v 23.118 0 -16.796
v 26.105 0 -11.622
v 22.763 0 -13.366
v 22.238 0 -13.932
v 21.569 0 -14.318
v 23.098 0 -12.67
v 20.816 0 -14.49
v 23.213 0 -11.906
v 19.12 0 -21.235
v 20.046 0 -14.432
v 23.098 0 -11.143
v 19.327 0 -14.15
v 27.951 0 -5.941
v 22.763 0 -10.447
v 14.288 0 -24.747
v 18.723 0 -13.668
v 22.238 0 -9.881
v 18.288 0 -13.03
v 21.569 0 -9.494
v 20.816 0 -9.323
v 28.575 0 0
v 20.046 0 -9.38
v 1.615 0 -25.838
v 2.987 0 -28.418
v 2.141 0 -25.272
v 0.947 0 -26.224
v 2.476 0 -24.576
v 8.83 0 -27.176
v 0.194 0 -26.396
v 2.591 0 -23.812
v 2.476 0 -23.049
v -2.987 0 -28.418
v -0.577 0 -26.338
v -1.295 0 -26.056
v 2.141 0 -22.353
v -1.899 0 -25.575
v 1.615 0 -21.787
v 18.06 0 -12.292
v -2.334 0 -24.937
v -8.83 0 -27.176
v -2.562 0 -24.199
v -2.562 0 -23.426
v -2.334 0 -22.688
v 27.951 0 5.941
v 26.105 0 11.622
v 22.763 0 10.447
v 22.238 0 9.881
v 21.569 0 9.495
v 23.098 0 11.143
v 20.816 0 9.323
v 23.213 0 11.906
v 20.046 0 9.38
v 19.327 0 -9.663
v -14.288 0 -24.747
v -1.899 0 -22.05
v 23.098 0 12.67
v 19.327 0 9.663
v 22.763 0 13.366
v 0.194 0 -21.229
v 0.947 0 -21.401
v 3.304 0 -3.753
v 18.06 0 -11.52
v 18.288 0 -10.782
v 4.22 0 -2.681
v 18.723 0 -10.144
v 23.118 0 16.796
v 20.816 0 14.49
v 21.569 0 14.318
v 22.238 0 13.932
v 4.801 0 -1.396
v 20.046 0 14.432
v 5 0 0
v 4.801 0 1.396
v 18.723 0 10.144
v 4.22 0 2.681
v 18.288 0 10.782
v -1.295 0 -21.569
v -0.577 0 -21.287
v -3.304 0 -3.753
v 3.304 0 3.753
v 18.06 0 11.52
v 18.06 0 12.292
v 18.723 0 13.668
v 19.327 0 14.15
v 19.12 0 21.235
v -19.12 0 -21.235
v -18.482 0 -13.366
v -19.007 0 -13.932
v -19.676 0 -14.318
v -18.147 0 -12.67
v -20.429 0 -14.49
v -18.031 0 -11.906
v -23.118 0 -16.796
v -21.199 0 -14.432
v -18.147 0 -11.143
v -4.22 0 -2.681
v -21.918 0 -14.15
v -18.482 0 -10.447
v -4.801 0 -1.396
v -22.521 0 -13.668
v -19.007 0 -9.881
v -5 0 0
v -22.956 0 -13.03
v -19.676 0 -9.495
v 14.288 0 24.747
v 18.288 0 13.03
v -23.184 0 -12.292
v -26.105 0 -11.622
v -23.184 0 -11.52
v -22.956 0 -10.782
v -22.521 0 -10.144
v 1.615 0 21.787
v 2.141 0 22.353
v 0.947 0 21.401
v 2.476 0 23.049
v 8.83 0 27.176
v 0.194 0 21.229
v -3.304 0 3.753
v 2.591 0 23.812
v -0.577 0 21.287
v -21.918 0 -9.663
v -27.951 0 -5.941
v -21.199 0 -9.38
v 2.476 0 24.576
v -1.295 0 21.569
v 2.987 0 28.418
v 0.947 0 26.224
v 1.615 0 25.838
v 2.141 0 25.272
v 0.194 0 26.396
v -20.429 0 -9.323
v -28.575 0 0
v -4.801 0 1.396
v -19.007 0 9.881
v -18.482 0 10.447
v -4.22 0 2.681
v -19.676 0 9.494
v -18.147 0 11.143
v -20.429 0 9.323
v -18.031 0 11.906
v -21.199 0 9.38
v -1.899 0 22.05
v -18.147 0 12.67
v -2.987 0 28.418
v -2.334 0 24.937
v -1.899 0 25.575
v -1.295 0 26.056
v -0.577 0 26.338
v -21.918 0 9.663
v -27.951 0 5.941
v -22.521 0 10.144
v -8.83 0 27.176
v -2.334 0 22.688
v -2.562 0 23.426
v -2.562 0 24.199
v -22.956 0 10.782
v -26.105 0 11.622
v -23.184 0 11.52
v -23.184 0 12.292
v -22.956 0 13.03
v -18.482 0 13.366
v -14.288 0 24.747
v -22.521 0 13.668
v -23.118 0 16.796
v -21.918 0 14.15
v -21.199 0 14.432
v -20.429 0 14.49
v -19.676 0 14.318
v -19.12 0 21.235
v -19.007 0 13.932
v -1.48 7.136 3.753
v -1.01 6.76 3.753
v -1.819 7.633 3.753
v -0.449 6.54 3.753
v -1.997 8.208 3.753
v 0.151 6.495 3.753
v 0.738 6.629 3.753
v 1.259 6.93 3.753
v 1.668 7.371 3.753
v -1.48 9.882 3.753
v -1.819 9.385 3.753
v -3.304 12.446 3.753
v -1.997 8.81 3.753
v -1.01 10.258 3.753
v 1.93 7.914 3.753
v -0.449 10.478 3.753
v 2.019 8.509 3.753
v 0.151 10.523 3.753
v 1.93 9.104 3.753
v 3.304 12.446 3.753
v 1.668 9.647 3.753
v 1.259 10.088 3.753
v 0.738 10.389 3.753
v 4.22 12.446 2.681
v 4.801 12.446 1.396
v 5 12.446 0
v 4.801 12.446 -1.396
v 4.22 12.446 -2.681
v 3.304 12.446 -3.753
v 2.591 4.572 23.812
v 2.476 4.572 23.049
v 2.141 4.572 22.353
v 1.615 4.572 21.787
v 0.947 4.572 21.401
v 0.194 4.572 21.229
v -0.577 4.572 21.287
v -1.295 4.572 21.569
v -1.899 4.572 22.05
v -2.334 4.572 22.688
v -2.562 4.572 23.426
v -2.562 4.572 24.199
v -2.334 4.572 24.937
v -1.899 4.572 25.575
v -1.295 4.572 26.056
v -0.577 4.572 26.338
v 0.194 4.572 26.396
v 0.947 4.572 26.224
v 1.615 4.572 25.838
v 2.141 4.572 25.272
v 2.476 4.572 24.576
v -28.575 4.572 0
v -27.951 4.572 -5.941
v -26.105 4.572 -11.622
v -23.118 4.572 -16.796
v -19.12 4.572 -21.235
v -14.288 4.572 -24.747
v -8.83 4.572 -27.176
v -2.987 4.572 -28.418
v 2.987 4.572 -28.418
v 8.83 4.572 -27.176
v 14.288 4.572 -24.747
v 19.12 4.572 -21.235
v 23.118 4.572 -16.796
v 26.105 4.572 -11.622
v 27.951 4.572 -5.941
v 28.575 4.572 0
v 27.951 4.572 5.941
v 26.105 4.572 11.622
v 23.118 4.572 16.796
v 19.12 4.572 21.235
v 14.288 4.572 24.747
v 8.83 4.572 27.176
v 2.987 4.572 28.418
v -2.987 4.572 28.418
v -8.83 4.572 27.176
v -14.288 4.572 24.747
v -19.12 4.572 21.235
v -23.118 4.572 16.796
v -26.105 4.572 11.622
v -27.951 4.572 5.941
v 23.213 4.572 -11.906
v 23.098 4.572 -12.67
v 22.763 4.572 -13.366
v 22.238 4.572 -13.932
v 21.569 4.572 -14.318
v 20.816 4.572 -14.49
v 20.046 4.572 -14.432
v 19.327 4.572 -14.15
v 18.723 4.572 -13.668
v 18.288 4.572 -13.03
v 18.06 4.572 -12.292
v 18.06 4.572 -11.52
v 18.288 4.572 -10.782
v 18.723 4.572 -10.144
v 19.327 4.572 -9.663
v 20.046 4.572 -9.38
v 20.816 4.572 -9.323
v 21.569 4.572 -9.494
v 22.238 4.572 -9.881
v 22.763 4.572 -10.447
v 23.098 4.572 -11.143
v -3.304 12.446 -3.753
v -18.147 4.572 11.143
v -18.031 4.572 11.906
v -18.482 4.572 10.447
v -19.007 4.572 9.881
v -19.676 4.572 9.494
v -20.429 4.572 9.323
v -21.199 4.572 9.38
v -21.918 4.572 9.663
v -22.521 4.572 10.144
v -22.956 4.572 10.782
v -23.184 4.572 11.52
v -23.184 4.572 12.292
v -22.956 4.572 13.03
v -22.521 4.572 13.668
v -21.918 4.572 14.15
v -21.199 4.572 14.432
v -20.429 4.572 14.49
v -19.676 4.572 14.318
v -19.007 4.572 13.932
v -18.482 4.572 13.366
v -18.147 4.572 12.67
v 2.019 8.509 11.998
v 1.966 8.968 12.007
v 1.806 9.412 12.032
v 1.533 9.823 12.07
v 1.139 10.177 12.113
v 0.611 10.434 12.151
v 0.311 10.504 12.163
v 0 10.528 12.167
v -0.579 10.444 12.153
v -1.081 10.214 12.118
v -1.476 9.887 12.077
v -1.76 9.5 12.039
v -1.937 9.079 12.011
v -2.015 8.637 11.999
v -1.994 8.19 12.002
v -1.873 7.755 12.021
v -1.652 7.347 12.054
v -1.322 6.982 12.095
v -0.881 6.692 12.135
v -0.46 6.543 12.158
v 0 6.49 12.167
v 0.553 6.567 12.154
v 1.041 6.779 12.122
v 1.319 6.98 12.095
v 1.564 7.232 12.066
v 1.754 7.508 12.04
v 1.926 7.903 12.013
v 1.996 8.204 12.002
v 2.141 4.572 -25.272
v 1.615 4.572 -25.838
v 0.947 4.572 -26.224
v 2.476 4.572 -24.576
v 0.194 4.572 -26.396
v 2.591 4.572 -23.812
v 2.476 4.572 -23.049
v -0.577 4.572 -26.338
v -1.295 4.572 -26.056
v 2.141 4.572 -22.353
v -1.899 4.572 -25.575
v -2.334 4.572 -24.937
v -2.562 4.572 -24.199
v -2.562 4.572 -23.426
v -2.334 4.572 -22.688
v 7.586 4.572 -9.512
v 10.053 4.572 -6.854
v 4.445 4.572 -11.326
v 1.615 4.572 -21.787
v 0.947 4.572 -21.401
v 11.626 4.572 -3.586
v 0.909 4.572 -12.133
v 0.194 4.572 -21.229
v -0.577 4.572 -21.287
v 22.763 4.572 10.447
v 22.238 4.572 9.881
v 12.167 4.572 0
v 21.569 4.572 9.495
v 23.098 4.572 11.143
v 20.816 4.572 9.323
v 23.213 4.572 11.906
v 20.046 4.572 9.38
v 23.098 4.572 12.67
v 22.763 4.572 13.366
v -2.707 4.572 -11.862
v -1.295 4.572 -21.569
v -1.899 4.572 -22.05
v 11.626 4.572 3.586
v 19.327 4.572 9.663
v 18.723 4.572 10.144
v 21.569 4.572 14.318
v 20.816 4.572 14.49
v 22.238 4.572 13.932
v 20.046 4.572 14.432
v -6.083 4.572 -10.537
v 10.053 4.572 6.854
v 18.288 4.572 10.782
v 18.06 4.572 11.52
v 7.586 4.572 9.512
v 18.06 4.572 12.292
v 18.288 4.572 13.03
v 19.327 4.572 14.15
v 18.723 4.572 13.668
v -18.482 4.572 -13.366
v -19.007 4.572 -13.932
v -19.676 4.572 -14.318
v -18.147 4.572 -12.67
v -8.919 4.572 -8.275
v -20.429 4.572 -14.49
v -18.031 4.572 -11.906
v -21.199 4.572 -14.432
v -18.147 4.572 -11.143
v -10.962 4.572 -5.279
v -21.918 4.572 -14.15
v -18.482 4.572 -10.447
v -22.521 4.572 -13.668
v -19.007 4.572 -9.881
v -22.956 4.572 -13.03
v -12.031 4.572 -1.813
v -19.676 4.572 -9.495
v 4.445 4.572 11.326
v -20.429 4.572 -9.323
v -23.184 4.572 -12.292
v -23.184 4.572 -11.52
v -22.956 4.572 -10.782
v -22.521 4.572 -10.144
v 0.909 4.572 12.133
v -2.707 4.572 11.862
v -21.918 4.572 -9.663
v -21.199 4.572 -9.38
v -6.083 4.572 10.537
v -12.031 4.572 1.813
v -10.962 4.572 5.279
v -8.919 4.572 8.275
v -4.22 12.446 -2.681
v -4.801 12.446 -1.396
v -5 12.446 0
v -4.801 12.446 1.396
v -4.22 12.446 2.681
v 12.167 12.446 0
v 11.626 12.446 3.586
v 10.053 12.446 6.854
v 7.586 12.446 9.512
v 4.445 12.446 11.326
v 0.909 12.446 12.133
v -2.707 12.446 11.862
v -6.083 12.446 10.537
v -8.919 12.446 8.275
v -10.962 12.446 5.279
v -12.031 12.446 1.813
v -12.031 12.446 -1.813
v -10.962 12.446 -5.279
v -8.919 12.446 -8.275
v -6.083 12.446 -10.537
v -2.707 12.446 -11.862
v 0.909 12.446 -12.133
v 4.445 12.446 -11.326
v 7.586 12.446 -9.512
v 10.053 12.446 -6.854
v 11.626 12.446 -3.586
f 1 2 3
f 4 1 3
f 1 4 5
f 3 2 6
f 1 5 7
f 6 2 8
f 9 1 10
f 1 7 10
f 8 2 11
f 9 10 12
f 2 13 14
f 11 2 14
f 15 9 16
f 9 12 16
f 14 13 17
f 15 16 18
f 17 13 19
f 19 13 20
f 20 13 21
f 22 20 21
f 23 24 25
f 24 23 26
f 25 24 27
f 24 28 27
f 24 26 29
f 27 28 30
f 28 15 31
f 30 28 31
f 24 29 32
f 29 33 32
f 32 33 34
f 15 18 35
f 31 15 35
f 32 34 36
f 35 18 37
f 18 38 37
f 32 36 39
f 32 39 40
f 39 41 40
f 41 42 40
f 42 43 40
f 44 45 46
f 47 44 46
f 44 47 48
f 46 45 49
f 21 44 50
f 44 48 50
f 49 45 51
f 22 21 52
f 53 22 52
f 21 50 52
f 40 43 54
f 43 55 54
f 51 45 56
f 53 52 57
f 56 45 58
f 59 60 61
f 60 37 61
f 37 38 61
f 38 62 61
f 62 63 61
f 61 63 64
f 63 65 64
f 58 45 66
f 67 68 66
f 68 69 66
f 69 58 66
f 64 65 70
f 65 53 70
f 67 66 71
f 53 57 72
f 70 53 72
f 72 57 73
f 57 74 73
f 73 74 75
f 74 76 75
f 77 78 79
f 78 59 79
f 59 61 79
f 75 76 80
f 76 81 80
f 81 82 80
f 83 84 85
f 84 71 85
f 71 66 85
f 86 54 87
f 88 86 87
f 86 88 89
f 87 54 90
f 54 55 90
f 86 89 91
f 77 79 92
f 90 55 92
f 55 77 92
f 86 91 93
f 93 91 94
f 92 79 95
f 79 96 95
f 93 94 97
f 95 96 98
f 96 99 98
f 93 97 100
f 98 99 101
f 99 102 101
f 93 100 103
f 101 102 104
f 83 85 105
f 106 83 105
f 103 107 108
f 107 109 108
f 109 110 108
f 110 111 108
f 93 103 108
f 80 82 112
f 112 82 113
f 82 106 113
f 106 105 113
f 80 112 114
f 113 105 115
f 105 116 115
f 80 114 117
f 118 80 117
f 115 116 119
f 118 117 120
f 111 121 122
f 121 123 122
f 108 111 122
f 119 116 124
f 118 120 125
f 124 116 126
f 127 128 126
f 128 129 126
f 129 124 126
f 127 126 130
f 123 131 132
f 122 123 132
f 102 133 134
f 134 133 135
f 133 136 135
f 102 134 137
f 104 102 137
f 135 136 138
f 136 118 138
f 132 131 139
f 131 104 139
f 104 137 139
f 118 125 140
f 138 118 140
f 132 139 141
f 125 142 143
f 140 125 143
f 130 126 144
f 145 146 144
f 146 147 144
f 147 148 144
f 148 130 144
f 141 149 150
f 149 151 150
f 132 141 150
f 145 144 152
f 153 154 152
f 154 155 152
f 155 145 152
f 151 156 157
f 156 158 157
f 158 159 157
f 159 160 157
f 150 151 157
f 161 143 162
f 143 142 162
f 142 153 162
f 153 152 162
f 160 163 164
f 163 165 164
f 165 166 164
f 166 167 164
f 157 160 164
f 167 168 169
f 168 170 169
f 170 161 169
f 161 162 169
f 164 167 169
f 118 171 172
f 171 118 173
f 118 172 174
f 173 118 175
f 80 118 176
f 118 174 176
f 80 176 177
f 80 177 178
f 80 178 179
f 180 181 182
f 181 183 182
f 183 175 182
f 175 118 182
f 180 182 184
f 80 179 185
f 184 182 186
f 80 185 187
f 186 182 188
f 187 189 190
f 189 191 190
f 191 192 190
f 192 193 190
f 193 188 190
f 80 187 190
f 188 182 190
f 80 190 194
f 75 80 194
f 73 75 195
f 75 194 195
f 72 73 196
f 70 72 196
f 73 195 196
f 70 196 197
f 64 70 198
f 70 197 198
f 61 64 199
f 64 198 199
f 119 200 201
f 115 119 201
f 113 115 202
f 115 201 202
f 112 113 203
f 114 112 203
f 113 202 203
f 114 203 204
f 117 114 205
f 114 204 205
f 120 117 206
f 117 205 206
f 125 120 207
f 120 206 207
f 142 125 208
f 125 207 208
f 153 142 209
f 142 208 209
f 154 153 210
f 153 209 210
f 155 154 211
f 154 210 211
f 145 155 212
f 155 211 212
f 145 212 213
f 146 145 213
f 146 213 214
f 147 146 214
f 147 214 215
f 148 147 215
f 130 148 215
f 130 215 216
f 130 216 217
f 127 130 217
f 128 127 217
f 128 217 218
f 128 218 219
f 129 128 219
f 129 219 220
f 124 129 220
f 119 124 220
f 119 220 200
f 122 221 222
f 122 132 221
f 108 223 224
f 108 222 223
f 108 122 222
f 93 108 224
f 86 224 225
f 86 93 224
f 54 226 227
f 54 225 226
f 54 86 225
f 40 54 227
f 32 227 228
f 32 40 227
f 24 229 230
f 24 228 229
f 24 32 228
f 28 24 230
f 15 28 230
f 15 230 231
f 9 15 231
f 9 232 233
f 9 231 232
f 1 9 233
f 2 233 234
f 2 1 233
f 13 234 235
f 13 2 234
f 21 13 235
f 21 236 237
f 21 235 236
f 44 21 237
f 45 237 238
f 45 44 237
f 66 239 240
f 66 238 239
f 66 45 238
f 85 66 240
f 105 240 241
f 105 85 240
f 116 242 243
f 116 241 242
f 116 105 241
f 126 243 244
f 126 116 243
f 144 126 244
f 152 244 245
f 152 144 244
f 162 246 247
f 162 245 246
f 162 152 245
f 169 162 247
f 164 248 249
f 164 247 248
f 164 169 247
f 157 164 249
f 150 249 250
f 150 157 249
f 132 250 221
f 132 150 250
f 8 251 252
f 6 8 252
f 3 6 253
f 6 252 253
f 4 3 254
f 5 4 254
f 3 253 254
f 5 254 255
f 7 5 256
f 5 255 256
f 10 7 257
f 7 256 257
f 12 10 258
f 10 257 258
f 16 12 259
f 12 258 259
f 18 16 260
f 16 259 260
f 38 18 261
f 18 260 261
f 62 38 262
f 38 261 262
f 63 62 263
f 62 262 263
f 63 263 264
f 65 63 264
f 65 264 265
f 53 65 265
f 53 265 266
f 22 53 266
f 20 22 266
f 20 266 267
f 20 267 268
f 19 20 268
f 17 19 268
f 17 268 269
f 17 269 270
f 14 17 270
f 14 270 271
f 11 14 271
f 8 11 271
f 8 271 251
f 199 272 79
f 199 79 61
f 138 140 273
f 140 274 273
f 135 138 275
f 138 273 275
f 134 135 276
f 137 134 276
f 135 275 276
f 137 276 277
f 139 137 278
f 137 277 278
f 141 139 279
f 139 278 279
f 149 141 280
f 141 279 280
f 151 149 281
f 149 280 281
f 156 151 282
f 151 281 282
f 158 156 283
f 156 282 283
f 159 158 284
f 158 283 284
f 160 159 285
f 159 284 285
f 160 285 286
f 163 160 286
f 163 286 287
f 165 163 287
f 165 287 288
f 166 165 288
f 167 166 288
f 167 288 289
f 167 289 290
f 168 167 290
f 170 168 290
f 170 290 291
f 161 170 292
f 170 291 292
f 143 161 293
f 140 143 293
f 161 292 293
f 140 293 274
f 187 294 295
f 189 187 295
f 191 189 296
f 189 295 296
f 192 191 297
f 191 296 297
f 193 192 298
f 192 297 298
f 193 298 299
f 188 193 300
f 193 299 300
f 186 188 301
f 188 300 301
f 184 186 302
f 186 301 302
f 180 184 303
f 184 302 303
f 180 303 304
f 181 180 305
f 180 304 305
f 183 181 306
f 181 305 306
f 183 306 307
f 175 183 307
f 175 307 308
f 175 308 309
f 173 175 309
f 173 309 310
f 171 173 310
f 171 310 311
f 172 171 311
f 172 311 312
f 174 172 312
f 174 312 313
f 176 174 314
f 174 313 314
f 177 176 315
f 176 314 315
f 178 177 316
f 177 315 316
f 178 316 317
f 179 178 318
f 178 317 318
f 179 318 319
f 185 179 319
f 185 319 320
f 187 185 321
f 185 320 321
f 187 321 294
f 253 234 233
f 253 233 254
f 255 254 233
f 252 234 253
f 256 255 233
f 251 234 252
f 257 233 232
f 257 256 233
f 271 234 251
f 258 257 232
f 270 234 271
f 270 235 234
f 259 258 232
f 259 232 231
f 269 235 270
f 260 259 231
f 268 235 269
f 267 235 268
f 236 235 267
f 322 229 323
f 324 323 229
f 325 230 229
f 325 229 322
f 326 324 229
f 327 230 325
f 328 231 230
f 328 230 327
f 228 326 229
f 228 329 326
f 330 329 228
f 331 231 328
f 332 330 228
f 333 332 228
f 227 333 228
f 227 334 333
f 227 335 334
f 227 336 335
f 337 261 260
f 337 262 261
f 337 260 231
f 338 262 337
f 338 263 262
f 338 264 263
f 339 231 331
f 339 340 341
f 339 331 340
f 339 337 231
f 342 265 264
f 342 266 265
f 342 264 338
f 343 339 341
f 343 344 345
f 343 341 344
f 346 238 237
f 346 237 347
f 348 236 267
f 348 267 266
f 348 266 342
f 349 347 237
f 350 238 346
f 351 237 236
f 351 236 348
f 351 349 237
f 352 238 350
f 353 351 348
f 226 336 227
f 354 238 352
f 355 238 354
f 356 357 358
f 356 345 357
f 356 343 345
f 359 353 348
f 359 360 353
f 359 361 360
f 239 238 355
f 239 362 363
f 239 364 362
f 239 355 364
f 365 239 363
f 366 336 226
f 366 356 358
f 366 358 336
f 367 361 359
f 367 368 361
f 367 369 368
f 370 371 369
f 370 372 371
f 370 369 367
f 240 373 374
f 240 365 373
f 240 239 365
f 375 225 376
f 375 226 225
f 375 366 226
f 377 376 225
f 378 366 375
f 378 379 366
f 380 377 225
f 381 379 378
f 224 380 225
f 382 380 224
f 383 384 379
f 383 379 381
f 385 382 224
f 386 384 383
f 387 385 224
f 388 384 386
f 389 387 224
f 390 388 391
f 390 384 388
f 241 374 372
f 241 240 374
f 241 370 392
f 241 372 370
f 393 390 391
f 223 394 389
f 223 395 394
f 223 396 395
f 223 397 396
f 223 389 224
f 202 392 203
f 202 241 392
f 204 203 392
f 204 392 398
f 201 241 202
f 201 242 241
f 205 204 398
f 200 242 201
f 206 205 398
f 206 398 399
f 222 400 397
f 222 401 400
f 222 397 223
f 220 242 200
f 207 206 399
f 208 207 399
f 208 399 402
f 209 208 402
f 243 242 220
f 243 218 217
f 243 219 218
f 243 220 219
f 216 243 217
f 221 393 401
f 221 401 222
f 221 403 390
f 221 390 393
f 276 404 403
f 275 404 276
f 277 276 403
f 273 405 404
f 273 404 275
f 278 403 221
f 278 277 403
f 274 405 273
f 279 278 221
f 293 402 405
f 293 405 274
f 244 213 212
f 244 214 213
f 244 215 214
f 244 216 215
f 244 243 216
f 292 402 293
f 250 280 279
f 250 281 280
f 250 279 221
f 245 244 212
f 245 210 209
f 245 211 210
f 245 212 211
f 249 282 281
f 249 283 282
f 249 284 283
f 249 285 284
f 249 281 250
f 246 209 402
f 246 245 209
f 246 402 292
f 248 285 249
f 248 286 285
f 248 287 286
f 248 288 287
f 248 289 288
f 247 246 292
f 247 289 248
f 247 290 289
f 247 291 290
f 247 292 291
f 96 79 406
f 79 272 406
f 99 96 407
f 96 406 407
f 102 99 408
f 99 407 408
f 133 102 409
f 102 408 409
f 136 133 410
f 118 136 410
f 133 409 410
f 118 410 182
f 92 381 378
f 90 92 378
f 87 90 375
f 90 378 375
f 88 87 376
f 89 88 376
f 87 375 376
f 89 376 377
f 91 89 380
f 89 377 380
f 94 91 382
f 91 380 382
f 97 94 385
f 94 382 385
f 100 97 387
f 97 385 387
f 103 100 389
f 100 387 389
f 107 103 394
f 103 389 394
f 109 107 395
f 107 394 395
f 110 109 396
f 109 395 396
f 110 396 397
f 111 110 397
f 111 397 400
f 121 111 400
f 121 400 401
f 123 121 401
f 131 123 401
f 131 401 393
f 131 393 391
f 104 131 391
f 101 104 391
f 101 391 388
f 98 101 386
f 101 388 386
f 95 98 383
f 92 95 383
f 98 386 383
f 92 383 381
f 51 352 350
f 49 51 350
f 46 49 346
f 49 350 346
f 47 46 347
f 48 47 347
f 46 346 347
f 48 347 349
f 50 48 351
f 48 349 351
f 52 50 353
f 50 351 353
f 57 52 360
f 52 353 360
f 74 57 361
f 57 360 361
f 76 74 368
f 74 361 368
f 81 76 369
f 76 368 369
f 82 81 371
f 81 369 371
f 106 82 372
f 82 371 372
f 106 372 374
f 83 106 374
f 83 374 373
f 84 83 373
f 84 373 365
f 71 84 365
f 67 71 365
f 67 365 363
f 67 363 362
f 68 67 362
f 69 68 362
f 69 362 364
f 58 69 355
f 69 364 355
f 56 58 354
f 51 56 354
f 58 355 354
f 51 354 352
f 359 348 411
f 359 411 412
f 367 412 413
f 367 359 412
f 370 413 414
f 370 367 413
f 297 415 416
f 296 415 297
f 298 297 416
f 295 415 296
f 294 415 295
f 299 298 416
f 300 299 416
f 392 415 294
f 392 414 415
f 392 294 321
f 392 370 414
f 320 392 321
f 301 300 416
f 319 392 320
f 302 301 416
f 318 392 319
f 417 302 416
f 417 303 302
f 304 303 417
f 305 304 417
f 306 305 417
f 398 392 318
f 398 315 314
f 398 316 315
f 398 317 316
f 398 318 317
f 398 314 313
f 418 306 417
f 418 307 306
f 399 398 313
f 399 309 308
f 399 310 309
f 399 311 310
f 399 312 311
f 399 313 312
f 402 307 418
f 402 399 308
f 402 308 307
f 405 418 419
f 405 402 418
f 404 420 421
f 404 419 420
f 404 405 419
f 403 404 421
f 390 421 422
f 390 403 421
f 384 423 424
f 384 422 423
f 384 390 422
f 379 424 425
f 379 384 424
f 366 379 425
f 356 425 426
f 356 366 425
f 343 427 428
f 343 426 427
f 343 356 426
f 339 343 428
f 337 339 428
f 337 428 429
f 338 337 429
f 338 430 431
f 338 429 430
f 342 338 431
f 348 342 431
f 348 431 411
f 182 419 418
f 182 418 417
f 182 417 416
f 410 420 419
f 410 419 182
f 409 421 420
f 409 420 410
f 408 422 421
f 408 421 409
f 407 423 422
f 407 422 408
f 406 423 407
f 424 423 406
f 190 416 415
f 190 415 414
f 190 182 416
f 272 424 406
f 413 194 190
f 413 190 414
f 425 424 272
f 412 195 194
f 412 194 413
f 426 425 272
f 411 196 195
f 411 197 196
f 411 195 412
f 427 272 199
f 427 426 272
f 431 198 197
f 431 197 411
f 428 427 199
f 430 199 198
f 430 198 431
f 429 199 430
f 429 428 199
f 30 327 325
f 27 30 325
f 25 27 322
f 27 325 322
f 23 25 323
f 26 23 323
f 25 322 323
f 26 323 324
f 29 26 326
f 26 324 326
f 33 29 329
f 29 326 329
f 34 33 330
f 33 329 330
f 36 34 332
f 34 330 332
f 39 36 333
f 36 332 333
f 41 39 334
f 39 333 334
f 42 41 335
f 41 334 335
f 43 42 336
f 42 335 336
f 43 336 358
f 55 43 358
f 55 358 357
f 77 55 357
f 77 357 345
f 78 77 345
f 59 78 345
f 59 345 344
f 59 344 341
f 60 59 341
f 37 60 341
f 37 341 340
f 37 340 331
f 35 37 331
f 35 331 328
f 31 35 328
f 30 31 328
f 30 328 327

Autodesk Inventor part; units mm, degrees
ref_plane "YZ Plane" through (0, 0, 0) normal (1, 0, 0) x (0, 1, 0)
ref_plane "XZ Plane" through (0, 0, 0) normal (0, 1, 0) x (-1, 0, 0)
ref_plane "XY Plane" through (0, 0, 0) normal (0, 0, 1) x (1, 0, 0)
sketch "Sketch1" plane through (0, 0, 0) normal (0, 1, 0) x (-1, 0, 0)
  circle A0 centre (0, 0) radius 28.575
  dimension "d0" = 57.15
extrude "Extrusion1" add sketch "Sketch1" along normal blind 4.572
sketch "Sketch2" plane through (0, 4.572, 0) normal (0, 1, 0) x (1, 0, 0)
  circle A0 centre (0, 0) radius 28.575 projected
  circle A1 centre (0, 0) radius 12.1666
  dimension "d3" = 24.3332
extrude "Extrusion2" add sketch "Sketch2" along normal blind 7.874 contours A1
sketch "Sketch3" plane through (0, 4.572, 0) normal (0, 1, 0) x (1, 0, 0)
  circle A0 centre (0, 0) radius 28.575 projected
  circle A1 centre (0, 0) radius 23.8125 construction
  circle A2 centre (0, 23.8125) radius 2.5908
  line L0 (0, 0) -> (0, 23.8125) construction
  circle A3 centre (-20.6222, 11.9063) radius 2.5908
  circle A4 centre (-20.6222, -11.9062) radius 2.5908
  circle A5 centre (0, -23.8125) radius 2.5908
  circle A6 centre (20.6222, -11.9063) radius 2.5908
  circle A7 centre (20.6222, 11.9062) radius 2.5908
  dimension "d6" = 47.625
  dimension "d7" = 5.1816
  dimension "d10" = 360
extrude "Extrusion3" cut sketch "Sketch3" against normal blind 7.874 contours A2 | A3 | A4 | A5 | A6 | A7
sketch "Sketch4" plane through (0, 12.446, 0) normal (0, 1, 0) x (1, 0, 0)
  circle A0 centre (0, 0) radius 12.1666 projected
  line L0 (-3.304, 3.7529) -> (3.304, 3.7529)
  line L1 (-3.304, -3.7528) -> (3.304, -3.7528)
  line L2 (3.304, 3.7529) -> (3.304, -3.7528) construction
  line L3 (-3.304, 3.7529) -> (-3.304, -3.7528) construction
  arc A1 (-3.304, 3.7529) -> (-3.304, -3.7528) centre (0, 0) ccw
  arc A2 (3.304, -3.7528) -> (3.304, 3.7529) centre (0, 0) ccw
  dimension "d15" = 7.5057
  dimension "d16" = 5
  dimension "d17" = 5
extrude "Extrusion4" cut sketch "Sketch4" against normal blind 14.986 contours L0 A2 L1 A1
ref_plane "Work Plane1" through (0, 4.572, 12.1666) normal (0, 0, 1) x (1, 0, 0)
sketch "Sketch5" plane through (0, 4.572, 12.1666) normal (0, 0, 1) x (1, 0, 0)
  circle A0 centre (0, 3.937) radius 2.0193
  line L0 (0, -4.572) -> (0, 3.937) construction
  line L1 (-28.575, -4.572) -> (28.575, -4.572) construction
  dimension "d20" = 8.509
  dimension "d21" = 4.0386
extrude "Extrusion5" cut sketch "Sketch5" against normal blind 12.3698
properties part number "Snowblower Hub"
